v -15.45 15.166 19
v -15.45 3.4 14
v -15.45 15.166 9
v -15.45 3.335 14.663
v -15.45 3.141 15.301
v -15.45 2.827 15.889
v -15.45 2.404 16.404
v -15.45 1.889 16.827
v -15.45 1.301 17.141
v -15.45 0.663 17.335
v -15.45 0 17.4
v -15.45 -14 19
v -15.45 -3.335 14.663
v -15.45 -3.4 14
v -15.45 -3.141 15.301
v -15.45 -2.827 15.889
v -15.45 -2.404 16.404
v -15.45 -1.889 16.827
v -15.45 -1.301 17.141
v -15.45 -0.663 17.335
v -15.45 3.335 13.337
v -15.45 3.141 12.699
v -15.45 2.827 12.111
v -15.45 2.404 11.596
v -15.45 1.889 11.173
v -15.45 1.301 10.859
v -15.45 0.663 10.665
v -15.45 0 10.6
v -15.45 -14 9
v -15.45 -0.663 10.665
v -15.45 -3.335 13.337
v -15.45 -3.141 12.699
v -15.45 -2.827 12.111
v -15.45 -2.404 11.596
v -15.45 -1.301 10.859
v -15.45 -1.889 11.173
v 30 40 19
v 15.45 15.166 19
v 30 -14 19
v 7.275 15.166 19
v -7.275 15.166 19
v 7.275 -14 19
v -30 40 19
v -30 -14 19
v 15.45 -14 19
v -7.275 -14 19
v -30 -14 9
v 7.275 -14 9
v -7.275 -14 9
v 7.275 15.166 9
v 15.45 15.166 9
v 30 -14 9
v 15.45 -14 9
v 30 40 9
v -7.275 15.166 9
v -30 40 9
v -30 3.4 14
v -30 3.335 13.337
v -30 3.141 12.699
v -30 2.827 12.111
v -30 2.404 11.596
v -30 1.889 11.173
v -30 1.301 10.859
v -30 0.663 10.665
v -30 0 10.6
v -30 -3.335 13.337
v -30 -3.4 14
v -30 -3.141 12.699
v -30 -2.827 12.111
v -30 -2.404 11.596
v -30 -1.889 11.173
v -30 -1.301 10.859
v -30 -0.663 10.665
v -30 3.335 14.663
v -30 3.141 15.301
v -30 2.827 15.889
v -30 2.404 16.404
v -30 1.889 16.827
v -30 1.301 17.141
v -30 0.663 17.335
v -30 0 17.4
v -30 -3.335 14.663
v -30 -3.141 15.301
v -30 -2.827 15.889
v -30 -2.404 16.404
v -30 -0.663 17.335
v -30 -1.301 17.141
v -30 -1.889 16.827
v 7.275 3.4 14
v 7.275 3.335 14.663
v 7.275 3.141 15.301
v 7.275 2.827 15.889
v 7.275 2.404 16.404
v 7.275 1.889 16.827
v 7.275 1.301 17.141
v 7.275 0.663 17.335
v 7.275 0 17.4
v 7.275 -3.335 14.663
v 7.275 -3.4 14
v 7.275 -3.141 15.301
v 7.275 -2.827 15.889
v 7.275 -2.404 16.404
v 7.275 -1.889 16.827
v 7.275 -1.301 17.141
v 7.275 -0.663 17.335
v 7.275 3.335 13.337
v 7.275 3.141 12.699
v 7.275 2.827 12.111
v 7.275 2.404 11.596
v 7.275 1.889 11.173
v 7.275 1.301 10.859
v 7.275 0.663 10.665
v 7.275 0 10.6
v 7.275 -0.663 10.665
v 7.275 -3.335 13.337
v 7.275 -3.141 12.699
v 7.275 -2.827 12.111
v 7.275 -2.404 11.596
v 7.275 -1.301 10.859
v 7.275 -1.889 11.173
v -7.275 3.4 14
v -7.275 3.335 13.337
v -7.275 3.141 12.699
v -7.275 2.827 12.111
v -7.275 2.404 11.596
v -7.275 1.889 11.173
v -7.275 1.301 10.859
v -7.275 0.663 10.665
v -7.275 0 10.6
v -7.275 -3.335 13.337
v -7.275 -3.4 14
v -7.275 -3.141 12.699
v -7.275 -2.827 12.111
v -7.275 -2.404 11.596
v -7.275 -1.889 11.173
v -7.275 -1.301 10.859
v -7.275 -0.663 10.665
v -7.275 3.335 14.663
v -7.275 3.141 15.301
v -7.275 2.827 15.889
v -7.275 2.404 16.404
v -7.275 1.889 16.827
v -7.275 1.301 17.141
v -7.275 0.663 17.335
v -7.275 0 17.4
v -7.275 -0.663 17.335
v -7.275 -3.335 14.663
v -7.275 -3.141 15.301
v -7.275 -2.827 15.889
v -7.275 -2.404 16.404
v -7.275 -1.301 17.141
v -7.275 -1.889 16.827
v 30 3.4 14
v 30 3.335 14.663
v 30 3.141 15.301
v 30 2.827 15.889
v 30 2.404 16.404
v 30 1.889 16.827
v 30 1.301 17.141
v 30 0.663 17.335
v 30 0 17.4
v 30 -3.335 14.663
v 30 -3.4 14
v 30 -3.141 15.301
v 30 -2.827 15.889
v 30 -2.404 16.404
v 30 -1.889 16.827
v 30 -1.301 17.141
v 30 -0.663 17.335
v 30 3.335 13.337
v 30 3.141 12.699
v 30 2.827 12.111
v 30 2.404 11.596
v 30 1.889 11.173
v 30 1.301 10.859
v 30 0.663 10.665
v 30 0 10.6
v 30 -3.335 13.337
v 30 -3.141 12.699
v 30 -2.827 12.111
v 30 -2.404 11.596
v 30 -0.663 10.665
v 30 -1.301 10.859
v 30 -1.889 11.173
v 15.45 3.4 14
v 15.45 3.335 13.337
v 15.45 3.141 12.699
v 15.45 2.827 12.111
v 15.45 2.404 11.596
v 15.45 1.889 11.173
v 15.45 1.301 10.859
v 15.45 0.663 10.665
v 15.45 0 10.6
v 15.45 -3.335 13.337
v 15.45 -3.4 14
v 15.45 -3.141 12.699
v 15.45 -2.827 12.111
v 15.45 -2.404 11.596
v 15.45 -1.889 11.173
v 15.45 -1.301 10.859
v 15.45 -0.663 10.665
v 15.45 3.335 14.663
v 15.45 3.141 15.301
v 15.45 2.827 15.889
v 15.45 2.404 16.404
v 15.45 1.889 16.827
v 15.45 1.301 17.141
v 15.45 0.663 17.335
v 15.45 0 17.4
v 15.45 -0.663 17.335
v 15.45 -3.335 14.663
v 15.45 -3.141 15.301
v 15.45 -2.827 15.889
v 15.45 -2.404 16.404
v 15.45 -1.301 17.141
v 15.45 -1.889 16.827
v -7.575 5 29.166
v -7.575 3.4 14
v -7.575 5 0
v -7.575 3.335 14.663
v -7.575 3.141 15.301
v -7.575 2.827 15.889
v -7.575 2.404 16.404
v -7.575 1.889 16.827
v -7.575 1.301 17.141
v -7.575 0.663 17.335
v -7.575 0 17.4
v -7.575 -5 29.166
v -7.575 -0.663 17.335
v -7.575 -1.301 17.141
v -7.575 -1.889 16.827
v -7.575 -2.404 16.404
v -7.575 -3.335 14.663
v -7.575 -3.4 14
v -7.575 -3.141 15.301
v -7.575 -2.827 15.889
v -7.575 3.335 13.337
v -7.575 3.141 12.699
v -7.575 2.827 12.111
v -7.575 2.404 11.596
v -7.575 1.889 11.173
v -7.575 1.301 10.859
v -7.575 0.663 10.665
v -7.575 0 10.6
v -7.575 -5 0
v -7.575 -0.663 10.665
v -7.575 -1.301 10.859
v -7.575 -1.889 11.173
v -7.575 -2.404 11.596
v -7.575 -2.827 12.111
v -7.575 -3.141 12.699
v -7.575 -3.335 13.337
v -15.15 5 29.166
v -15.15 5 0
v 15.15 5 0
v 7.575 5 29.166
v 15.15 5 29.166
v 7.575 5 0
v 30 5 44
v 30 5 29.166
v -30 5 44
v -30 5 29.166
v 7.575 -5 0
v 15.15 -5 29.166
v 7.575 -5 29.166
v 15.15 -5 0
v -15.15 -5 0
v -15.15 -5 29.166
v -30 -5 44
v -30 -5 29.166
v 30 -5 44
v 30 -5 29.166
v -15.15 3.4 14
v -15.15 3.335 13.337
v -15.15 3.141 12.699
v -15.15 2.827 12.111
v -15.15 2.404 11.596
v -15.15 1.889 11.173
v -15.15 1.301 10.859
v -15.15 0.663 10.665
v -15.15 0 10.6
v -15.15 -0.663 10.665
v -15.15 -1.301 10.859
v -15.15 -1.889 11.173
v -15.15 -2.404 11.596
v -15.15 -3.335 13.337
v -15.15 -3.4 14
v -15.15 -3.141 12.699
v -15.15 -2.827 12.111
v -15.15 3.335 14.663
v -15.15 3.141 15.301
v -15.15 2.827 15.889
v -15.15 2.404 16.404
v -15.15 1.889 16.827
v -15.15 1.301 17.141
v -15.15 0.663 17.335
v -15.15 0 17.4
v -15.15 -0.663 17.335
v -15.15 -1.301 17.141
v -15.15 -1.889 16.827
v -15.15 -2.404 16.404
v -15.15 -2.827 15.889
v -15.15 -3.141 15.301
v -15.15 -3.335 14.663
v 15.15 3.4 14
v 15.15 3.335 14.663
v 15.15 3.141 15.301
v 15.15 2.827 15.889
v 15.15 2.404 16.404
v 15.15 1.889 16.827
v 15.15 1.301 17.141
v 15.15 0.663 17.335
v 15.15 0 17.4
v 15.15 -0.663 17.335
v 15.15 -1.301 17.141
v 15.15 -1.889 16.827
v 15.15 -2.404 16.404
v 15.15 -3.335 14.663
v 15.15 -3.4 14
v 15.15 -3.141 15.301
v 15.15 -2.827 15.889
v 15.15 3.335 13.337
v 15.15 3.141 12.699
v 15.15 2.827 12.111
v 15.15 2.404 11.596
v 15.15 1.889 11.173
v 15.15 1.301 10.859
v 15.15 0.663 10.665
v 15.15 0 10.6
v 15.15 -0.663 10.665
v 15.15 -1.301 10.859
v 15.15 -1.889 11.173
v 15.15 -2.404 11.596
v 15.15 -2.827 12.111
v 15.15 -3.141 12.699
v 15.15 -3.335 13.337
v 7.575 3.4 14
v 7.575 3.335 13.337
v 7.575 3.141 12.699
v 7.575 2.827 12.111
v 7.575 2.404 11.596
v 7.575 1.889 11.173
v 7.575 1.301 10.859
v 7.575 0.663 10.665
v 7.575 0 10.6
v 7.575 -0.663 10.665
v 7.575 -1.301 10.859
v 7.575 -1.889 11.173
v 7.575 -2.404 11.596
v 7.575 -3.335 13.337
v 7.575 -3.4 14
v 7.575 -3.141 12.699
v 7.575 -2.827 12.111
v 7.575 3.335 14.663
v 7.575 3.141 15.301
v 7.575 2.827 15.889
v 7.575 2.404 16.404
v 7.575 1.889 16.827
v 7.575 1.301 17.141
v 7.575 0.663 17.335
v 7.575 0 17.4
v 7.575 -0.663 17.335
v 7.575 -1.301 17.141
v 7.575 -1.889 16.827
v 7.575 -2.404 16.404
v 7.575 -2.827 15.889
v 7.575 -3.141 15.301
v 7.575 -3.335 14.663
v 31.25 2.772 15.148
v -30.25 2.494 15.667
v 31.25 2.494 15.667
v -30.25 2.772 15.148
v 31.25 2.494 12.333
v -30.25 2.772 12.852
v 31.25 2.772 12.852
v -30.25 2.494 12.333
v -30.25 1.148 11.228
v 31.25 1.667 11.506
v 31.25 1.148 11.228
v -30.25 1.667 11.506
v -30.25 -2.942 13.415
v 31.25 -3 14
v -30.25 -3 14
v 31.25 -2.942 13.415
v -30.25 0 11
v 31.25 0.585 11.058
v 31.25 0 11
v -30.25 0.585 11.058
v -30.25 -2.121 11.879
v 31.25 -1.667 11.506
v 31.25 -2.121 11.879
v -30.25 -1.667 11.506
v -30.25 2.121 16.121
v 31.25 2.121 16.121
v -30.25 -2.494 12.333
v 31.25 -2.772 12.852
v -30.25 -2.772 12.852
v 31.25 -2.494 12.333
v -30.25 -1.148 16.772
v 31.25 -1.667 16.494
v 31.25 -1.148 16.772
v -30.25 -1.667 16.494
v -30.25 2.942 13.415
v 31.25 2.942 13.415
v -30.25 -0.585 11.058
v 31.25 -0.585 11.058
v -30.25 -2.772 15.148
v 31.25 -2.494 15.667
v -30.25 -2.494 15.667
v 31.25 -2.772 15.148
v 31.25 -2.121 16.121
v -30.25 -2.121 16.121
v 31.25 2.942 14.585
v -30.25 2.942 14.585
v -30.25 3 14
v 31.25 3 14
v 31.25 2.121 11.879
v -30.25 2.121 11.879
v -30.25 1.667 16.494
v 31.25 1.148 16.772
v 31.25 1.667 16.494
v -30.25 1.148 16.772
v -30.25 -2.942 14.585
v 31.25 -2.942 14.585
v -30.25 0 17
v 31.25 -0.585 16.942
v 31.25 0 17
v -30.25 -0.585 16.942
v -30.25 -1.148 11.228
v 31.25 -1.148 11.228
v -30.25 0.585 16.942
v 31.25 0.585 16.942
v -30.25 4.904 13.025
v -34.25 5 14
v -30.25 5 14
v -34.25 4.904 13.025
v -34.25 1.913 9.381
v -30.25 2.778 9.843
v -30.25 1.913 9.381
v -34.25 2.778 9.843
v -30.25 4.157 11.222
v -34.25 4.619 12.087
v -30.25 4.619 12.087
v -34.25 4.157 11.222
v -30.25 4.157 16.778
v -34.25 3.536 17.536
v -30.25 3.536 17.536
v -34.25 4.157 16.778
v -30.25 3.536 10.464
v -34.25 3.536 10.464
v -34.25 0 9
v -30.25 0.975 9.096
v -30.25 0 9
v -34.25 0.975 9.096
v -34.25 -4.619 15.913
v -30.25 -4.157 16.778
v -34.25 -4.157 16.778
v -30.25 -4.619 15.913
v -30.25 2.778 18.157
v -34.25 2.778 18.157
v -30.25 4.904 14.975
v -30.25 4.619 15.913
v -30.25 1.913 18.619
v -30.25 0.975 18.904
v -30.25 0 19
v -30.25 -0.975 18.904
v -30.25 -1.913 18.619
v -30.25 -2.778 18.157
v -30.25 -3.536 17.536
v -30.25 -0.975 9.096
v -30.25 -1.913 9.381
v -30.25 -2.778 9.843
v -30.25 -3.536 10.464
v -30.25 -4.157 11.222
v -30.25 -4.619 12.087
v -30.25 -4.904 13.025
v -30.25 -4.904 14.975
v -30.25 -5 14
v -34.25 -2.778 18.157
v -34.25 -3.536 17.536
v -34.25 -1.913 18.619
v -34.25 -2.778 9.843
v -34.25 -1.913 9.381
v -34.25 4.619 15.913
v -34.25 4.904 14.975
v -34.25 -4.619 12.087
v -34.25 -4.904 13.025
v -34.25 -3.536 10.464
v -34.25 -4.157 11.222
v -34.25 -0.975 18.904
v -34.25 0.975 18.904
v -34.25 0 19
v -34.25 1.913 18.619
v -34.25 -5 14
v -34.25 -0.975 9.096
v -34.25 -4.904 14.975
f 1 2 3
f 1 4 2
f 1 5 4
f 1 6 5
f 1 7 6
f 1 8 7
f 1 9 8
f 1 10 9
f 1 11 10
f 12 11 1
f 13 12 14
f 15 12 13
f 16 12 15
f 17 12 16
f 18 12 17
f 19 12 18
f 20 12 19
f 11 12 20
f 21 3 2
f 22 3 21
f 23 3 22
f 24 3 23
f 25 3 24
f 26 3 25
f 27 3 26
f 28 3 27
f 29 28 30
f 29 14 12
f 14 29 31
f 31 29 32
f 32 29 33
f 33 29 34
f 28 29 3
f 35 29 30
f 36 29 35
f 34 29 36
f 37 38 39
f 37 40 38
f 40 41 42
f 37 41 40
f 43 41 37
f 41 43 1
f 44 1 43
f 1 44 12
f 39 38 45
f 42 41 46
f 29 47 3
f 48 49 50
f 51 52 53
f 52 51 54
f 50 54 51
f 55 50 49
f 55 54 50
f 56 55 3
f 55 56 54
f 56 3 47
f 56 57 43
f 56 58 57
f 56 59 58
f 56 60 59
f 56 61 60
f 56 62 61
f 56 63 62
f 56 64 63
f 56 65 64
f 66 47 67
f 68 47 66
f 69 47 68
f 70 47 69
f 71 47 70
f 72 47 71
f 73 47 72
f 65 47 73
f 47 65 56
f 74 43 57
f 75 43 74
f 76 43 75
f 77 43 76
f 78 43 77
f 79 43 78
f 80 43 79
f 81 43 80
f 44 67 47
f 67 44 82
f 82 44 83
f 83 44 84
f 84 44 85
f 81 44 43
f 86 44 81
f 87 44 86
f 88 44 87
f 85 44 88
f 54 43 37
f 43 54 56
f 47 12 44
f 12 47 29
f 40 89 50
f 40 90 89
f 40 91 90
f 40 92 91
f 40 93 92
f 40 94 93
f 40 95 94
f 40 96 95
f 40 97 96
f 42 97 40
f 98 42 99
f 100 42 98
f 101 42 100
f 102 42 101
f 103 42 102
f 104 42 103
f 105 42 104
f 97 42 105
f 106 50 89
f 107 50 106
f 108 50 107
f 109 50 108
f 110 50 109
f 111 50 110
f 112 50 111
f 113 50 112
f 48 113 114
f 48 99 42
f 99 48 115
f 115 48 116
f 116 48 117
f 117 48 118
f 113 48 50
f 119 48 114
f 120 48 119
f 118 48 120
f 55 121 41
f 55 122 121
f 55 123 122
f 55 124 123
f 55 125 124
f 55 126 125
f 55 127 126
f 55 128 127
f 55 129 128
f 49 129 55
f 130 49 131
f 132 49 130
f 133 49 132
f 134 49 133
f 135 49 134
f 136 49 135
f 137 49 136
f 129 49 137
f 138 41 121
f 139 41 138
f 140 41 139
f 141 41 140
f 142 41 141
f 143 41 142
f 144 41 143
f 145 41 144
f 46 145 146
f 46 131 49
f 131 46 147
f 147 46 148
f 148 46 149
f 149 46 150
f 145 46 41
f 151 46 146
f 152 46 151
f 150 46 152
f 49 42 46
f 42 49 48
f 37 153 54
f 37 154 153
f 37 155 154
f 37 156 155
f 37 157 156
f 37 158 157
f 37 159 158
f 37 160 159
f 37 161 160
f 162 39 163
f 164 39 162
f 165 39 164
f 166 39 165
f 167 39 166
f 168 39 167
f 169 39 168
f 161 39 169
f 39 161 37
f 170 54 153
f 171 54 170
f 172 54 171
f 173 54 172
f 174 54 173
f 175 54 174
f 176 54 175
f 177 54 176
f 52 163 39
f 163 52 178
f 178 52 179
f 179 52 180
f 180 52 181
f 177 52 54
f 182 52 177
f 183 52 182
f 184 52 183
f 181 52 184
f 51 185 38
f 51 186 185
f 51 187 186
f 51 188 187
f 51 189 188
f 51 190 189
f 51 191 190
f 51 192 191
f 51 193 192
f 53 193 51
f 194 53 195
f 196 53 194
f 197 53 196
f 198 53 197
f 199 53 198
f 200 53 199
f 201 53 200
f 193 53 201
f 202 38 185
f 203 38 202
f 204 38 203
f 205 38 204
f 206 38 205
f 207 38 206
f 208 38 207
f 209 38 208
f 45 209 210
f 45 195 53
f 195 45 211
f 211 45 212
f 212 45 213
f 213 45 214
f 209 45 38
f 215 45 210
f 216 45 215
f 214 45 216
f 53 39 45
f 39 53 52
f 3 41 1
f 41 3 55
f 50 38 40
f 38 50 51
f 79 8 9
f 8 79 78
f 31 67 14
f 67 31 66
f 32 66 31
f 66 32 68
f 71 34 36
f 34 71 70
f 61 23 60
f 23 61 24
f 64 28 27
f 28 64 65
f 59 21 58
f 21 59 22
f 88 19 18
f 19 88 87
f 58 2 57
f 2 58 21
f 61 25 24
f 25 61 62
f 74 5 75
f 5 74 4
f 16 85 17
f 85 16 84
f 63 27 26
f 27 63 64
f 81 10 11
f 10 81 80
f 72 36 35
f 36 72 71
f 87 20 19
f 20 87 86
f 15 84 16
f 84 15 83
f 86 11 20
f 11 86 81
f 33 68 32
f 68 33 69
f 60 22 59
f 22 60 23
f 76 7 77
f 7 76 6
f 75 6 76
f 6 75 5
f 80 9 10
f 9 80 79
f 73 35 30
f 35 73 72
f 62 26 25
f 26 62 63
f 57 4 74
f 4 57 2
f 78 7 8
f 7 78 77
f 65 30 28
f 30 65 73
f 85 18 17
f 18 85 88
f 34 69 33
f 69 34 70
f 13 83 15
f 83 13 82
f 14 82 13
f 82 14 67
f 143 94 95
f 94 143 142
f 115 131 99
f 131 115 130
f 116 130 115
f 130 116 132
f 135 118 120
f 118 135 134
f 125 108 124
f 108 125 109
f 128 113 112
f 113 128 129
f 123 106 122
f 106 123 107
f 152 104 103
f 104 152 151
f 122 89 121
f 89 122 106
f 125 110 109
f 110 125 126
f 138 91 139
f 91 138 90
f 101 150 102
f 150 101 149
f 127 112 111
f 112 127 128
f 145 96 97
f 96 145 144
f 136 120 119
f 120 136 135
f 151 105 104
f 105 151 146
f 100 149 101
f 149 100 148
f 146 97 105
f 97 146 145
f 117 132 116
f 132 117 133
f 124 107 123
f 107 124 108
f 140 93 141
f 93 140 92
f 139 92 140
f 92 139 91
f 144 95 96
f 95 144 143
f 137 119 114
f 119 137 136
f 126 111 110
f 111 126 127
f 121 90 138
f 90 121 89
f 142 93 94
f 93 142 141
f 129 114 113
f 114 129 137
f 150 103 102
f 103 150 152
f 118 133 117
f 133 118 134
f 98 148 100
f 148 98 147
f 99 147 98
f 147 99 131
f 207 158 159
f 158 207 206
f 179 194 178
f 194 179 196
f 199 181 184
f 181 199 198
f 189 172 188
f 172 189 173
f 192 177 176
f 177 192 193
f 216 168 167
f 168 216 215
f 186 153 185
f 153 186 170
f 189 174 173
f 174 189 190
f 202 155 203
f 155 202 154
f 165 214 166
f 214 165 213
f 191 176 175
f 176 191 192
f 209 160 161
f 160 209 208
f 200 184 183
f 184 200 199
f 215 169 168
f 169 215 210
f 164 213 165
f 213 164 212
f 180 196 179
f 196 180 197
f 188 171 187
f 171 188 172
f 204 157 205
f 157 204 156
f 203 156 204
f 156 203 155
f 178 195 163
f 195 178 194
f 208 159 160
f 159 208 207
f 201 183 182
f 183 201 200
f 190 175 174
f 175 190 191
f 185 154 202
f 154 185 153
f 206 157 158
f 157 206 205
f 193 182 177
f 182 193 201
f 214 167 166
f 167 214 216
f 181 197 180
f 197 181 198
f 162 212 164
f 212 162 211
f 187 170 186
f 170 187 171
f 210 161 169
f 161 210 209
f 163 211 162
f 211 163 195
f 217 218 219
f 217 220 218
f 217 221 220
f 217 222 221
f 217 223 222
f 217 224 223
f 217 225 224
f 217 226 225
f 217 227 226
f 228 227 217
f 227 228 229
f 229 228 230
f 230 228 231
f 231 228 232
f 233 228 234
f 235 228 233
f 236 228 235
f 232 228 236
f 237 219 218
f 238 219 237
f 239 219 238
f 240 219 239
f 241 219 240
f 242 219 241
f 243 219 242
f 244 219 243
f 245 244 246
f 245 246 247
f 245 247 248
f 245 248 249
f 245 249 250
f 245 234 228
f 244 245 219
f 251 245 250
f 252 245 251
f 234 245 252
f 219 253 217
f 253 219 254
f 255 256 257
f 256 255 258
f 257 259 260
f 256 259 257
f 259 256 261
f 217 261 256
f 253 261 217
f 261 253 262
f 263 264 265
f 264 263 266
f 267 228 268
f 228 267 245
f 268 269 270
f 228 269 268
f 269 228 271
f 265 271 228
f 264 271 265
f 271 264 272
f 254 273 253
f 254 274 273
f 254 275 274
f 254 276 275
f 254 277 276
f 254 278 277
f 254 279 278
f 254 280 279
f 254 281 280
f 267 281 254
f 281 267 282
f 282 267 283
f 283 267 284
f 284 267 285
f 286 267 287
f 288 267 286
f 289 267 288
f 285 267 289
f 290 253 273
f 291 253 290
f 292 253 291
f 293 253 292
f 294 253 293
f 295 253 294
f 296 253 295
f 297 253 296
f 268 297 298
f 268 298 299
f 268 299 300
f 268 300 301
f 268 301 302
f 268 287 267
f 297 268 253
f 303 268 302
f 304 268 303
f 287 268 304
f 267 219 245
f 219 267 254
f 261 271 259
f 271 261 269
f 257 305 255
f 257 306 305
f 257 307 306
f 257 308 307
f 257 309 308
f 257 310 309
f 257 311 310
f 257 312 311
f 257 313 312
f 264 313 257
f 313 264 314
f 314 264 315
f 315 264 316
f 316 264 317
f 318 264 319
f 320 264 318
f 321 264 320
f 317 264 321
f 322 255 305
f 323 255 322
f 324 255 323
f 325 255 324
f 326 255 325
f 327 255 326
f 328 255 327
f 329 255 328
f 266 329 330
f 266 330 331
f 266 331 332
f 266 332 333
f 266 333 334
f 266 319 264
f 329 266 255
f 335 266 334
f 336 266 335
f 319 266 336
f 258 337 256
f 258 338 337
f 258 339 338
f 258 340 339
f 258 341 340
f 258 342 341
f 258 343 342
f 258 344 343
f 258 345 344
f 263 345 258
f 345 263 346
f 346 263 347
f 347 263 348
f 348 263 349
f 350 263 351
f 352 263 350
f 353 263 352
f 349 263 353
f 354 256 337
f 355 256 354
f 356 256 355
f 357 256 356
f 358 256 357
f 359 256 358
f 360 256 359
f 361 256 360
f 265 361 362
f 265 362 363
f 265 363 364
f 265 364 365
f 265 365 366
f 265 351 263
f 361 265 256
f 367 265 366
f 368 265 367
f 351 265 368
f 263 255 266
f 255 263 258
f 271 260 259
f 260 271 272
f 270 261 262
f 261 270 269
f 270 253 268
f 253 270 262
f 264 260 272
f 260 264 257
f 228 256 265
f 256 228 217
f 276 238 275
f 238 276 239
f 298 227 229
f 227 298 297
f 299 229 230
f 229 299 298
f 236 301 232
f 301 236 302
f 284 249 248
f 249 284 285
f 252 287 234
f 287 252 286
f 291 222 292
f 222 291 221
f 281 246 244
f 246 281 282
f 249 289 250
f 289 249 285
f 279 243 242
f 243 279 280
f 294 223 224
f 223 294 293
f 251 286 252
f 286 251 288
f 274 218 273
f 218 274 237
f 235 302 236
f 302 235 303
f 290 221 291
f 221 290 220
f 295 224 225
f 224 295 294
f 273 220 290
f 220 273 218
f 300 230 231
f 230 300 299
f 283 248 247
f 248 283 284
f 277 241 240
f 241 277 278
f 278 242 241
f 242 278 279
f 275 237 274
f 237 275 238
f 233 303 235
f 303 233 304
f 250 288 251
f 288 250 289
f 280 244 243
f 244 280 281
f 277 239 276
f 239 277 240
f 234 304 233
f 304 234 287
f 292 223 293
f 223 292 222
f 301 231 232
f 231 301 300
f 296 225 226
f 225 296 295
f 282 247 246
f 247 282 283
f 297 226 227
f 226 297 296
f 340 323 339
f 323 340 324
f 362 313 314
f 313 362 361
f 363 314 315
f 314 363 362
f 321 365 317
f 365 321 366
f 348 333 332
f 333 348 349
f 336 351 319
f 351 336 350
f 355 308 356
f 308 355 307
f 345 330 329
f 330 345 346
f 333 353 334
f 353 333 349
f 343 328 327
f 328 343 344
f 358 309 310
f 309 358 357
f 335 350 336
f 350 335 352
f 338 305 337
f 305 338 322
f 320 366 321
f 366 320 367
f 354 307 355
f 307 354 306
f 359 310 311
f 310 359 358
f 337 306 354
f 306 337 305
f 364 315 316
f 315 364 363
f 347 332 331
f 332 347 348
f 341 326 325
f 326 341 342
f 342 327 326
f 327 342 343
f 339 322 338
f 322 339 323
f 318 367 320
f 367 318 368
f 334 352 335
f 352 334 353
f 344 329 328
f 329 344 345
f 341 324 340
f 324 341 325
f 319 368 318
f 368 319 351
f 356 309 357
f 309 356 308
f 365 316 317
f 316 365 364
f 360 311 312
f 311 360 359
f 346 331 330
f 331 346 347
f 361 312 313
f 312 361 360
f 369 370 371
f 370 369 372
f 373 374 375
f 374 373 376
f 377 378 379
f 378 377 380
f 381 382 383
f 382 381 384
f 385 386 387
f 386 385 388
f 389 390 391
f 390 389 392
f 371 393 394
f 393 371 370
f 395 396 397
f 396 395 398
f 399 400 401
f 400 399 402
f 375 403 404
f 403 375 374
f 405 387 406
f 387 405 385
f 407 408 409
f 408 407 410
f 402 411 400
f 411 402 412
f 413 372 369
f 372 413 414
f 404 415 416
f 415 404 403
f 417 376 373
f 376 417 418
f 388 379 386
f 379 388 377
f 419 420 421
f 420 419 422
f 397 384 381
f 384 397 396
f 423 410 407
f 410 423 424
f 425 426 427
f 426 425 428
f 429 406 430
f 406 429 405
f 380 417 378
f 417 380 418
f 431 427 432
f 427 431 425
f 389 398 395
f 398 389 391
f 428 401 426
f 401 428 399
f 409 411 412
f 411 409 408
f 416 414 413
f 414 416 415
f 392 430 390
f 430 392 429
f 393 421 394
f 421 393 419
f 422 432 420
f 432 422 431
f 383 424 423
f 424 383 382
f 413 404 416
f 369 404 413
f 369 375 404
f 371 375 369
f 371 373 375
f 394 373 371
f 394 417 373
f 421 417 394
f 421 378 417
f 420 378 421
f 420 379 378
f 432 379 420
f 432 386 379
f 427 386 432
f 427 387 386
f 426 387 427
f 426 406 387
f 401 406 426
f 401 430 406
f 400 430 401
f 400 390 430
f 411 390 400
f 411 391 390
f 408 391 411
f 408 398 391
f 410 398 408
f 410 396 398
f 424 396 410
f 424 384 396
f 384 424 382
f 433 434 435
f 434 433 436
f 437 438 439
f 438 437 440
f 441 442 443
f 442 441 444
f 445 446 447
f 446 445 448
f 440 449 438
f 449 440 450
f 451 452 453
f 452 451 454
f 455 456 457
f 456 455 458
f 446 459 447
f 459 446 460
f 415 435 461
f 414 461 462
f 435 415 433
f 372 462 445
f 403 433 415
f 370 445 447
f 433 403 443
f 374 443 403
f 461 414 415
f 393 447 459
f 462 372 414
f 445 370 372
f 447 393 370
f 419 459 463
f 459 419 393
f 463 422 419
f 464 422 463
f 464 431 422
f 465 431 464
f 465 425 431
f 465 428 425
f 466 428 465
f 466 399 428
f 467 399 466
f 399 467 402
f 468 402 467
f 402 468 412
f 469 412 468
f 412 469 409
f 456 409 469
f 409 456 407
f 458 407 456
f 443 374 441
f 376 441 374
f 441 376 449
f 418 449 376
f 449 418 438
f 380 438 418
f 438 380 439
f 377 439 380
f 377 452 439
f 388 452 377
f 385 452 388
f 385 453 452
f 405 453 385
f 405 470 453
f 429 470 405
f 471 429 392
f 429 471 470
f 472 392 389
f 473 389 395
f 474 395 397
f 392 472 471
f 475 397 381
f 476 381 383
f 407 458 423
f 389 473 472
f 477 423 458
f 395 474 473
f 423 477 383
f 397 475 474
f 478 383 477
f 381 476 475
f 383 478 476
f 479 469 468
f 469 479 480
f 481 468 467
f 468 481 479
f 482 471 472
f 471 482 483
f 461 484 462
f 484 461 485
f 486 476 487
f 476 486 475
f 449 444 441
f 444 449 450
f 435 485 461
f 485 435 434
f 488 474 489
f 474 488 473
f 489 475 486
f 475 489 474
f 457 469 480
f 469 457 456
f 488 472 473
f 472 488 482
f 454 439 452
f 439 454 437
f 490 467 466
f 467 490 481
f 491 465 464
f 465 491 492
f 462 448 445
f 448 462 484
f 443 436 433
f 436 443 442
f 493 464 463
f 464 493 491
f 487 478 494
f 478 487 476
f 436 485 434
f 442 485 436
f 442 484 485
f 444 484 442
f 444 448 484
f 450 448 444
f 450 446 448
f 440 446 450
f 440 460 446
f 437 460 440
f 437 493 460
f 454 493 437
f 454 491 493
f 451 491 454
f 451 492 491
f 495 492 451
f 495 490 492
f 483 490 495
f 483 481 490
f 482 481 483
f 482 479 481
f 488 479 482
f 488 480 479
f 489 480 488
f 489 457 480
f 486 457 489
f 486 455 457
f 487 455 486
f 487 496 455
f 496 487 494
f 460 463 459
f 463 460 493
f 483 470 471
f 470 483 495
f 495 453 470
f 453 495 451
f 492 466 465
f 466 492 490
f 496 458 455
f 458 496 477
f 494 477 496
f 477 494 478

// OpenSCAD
$fn = 32;

// ------------------------------------------------------------------------
// Butt hinge: hinge 60 mm, leaf swung 270 deg
// Every part is its own module, assembly() places every instance.
// ------------------------------------------------------------------------

// --- part 1 ---
module hinge_base() {
  difference() {
    union() {
      translate([-30, -14, -5]) cube([14.55, 54, 10]);
      translate([-7.275, -14, -5]) cube([14.55, 54, 10]);
      translate([15.45, -14, -5]) cube([14.55, 54, 10]);
      translate([-30, 15.166, -5]) cube([60, 24.834, 10]);
    }
    translate([-22.725, 0, 0]) rotate([0, 90, 0]) cylinder(h = 16.55, d = 6.8, center = true);
    translate([0, 0, 0]) rotate([0, 90, 0]) cylinder(h = 16.55, d = 6.8, center = true);
    translate([22.725, 0, 0]) rotate([0, 90, 0]) cylinder(h = 16.55, d = 6.8, center = true);
  }
}

// --- part 2 ---
module hinge_mover() {
  difference() {
    union() {
      translate([-15.15, -30, -5]) cube([7.575, 44, 10]);
      translate([7.575, -30, -5]) cube([7.575, 44, 10]);
      translate([-30, -30, -5]) cube([60, 14.834, 10]);
    }
    translate([-11.362, 0, 0]) rotate([0, 90, 0]) cylinder(h = 9.575, d = 6.8, center = true);
    translate([11.362, 0, 0]) rotate([0, 90, 0]) cylinder(h = 9.575, d = 6.8, center = true);
  }
}

// --- part 3 ---
module hinge_pin() {
  rotate([0, 90, 0]) cylinder(h = 62.5, d = 6, center = true);
  translate([-34.25, 0, 0]) rotate([0, 90, 0]) cylinder(h = 4, d = 10);
}

// --- assembly ---
module assembly() {
  color([0.80, 0.24, 0.20]) translate([0, 0, 14]) rotate([0, 0, 0]) hinge_base();
  color([0.20, 0.45, 0.75]) translate([0, 0, 14]) rotate([270, 0, 0]) hinge_mover();
  color([0.25, 0.62, 0.32]) translate([0, 0, 14]) rotate([0, 0, 0]) hinge_pin();
}

assembly();
